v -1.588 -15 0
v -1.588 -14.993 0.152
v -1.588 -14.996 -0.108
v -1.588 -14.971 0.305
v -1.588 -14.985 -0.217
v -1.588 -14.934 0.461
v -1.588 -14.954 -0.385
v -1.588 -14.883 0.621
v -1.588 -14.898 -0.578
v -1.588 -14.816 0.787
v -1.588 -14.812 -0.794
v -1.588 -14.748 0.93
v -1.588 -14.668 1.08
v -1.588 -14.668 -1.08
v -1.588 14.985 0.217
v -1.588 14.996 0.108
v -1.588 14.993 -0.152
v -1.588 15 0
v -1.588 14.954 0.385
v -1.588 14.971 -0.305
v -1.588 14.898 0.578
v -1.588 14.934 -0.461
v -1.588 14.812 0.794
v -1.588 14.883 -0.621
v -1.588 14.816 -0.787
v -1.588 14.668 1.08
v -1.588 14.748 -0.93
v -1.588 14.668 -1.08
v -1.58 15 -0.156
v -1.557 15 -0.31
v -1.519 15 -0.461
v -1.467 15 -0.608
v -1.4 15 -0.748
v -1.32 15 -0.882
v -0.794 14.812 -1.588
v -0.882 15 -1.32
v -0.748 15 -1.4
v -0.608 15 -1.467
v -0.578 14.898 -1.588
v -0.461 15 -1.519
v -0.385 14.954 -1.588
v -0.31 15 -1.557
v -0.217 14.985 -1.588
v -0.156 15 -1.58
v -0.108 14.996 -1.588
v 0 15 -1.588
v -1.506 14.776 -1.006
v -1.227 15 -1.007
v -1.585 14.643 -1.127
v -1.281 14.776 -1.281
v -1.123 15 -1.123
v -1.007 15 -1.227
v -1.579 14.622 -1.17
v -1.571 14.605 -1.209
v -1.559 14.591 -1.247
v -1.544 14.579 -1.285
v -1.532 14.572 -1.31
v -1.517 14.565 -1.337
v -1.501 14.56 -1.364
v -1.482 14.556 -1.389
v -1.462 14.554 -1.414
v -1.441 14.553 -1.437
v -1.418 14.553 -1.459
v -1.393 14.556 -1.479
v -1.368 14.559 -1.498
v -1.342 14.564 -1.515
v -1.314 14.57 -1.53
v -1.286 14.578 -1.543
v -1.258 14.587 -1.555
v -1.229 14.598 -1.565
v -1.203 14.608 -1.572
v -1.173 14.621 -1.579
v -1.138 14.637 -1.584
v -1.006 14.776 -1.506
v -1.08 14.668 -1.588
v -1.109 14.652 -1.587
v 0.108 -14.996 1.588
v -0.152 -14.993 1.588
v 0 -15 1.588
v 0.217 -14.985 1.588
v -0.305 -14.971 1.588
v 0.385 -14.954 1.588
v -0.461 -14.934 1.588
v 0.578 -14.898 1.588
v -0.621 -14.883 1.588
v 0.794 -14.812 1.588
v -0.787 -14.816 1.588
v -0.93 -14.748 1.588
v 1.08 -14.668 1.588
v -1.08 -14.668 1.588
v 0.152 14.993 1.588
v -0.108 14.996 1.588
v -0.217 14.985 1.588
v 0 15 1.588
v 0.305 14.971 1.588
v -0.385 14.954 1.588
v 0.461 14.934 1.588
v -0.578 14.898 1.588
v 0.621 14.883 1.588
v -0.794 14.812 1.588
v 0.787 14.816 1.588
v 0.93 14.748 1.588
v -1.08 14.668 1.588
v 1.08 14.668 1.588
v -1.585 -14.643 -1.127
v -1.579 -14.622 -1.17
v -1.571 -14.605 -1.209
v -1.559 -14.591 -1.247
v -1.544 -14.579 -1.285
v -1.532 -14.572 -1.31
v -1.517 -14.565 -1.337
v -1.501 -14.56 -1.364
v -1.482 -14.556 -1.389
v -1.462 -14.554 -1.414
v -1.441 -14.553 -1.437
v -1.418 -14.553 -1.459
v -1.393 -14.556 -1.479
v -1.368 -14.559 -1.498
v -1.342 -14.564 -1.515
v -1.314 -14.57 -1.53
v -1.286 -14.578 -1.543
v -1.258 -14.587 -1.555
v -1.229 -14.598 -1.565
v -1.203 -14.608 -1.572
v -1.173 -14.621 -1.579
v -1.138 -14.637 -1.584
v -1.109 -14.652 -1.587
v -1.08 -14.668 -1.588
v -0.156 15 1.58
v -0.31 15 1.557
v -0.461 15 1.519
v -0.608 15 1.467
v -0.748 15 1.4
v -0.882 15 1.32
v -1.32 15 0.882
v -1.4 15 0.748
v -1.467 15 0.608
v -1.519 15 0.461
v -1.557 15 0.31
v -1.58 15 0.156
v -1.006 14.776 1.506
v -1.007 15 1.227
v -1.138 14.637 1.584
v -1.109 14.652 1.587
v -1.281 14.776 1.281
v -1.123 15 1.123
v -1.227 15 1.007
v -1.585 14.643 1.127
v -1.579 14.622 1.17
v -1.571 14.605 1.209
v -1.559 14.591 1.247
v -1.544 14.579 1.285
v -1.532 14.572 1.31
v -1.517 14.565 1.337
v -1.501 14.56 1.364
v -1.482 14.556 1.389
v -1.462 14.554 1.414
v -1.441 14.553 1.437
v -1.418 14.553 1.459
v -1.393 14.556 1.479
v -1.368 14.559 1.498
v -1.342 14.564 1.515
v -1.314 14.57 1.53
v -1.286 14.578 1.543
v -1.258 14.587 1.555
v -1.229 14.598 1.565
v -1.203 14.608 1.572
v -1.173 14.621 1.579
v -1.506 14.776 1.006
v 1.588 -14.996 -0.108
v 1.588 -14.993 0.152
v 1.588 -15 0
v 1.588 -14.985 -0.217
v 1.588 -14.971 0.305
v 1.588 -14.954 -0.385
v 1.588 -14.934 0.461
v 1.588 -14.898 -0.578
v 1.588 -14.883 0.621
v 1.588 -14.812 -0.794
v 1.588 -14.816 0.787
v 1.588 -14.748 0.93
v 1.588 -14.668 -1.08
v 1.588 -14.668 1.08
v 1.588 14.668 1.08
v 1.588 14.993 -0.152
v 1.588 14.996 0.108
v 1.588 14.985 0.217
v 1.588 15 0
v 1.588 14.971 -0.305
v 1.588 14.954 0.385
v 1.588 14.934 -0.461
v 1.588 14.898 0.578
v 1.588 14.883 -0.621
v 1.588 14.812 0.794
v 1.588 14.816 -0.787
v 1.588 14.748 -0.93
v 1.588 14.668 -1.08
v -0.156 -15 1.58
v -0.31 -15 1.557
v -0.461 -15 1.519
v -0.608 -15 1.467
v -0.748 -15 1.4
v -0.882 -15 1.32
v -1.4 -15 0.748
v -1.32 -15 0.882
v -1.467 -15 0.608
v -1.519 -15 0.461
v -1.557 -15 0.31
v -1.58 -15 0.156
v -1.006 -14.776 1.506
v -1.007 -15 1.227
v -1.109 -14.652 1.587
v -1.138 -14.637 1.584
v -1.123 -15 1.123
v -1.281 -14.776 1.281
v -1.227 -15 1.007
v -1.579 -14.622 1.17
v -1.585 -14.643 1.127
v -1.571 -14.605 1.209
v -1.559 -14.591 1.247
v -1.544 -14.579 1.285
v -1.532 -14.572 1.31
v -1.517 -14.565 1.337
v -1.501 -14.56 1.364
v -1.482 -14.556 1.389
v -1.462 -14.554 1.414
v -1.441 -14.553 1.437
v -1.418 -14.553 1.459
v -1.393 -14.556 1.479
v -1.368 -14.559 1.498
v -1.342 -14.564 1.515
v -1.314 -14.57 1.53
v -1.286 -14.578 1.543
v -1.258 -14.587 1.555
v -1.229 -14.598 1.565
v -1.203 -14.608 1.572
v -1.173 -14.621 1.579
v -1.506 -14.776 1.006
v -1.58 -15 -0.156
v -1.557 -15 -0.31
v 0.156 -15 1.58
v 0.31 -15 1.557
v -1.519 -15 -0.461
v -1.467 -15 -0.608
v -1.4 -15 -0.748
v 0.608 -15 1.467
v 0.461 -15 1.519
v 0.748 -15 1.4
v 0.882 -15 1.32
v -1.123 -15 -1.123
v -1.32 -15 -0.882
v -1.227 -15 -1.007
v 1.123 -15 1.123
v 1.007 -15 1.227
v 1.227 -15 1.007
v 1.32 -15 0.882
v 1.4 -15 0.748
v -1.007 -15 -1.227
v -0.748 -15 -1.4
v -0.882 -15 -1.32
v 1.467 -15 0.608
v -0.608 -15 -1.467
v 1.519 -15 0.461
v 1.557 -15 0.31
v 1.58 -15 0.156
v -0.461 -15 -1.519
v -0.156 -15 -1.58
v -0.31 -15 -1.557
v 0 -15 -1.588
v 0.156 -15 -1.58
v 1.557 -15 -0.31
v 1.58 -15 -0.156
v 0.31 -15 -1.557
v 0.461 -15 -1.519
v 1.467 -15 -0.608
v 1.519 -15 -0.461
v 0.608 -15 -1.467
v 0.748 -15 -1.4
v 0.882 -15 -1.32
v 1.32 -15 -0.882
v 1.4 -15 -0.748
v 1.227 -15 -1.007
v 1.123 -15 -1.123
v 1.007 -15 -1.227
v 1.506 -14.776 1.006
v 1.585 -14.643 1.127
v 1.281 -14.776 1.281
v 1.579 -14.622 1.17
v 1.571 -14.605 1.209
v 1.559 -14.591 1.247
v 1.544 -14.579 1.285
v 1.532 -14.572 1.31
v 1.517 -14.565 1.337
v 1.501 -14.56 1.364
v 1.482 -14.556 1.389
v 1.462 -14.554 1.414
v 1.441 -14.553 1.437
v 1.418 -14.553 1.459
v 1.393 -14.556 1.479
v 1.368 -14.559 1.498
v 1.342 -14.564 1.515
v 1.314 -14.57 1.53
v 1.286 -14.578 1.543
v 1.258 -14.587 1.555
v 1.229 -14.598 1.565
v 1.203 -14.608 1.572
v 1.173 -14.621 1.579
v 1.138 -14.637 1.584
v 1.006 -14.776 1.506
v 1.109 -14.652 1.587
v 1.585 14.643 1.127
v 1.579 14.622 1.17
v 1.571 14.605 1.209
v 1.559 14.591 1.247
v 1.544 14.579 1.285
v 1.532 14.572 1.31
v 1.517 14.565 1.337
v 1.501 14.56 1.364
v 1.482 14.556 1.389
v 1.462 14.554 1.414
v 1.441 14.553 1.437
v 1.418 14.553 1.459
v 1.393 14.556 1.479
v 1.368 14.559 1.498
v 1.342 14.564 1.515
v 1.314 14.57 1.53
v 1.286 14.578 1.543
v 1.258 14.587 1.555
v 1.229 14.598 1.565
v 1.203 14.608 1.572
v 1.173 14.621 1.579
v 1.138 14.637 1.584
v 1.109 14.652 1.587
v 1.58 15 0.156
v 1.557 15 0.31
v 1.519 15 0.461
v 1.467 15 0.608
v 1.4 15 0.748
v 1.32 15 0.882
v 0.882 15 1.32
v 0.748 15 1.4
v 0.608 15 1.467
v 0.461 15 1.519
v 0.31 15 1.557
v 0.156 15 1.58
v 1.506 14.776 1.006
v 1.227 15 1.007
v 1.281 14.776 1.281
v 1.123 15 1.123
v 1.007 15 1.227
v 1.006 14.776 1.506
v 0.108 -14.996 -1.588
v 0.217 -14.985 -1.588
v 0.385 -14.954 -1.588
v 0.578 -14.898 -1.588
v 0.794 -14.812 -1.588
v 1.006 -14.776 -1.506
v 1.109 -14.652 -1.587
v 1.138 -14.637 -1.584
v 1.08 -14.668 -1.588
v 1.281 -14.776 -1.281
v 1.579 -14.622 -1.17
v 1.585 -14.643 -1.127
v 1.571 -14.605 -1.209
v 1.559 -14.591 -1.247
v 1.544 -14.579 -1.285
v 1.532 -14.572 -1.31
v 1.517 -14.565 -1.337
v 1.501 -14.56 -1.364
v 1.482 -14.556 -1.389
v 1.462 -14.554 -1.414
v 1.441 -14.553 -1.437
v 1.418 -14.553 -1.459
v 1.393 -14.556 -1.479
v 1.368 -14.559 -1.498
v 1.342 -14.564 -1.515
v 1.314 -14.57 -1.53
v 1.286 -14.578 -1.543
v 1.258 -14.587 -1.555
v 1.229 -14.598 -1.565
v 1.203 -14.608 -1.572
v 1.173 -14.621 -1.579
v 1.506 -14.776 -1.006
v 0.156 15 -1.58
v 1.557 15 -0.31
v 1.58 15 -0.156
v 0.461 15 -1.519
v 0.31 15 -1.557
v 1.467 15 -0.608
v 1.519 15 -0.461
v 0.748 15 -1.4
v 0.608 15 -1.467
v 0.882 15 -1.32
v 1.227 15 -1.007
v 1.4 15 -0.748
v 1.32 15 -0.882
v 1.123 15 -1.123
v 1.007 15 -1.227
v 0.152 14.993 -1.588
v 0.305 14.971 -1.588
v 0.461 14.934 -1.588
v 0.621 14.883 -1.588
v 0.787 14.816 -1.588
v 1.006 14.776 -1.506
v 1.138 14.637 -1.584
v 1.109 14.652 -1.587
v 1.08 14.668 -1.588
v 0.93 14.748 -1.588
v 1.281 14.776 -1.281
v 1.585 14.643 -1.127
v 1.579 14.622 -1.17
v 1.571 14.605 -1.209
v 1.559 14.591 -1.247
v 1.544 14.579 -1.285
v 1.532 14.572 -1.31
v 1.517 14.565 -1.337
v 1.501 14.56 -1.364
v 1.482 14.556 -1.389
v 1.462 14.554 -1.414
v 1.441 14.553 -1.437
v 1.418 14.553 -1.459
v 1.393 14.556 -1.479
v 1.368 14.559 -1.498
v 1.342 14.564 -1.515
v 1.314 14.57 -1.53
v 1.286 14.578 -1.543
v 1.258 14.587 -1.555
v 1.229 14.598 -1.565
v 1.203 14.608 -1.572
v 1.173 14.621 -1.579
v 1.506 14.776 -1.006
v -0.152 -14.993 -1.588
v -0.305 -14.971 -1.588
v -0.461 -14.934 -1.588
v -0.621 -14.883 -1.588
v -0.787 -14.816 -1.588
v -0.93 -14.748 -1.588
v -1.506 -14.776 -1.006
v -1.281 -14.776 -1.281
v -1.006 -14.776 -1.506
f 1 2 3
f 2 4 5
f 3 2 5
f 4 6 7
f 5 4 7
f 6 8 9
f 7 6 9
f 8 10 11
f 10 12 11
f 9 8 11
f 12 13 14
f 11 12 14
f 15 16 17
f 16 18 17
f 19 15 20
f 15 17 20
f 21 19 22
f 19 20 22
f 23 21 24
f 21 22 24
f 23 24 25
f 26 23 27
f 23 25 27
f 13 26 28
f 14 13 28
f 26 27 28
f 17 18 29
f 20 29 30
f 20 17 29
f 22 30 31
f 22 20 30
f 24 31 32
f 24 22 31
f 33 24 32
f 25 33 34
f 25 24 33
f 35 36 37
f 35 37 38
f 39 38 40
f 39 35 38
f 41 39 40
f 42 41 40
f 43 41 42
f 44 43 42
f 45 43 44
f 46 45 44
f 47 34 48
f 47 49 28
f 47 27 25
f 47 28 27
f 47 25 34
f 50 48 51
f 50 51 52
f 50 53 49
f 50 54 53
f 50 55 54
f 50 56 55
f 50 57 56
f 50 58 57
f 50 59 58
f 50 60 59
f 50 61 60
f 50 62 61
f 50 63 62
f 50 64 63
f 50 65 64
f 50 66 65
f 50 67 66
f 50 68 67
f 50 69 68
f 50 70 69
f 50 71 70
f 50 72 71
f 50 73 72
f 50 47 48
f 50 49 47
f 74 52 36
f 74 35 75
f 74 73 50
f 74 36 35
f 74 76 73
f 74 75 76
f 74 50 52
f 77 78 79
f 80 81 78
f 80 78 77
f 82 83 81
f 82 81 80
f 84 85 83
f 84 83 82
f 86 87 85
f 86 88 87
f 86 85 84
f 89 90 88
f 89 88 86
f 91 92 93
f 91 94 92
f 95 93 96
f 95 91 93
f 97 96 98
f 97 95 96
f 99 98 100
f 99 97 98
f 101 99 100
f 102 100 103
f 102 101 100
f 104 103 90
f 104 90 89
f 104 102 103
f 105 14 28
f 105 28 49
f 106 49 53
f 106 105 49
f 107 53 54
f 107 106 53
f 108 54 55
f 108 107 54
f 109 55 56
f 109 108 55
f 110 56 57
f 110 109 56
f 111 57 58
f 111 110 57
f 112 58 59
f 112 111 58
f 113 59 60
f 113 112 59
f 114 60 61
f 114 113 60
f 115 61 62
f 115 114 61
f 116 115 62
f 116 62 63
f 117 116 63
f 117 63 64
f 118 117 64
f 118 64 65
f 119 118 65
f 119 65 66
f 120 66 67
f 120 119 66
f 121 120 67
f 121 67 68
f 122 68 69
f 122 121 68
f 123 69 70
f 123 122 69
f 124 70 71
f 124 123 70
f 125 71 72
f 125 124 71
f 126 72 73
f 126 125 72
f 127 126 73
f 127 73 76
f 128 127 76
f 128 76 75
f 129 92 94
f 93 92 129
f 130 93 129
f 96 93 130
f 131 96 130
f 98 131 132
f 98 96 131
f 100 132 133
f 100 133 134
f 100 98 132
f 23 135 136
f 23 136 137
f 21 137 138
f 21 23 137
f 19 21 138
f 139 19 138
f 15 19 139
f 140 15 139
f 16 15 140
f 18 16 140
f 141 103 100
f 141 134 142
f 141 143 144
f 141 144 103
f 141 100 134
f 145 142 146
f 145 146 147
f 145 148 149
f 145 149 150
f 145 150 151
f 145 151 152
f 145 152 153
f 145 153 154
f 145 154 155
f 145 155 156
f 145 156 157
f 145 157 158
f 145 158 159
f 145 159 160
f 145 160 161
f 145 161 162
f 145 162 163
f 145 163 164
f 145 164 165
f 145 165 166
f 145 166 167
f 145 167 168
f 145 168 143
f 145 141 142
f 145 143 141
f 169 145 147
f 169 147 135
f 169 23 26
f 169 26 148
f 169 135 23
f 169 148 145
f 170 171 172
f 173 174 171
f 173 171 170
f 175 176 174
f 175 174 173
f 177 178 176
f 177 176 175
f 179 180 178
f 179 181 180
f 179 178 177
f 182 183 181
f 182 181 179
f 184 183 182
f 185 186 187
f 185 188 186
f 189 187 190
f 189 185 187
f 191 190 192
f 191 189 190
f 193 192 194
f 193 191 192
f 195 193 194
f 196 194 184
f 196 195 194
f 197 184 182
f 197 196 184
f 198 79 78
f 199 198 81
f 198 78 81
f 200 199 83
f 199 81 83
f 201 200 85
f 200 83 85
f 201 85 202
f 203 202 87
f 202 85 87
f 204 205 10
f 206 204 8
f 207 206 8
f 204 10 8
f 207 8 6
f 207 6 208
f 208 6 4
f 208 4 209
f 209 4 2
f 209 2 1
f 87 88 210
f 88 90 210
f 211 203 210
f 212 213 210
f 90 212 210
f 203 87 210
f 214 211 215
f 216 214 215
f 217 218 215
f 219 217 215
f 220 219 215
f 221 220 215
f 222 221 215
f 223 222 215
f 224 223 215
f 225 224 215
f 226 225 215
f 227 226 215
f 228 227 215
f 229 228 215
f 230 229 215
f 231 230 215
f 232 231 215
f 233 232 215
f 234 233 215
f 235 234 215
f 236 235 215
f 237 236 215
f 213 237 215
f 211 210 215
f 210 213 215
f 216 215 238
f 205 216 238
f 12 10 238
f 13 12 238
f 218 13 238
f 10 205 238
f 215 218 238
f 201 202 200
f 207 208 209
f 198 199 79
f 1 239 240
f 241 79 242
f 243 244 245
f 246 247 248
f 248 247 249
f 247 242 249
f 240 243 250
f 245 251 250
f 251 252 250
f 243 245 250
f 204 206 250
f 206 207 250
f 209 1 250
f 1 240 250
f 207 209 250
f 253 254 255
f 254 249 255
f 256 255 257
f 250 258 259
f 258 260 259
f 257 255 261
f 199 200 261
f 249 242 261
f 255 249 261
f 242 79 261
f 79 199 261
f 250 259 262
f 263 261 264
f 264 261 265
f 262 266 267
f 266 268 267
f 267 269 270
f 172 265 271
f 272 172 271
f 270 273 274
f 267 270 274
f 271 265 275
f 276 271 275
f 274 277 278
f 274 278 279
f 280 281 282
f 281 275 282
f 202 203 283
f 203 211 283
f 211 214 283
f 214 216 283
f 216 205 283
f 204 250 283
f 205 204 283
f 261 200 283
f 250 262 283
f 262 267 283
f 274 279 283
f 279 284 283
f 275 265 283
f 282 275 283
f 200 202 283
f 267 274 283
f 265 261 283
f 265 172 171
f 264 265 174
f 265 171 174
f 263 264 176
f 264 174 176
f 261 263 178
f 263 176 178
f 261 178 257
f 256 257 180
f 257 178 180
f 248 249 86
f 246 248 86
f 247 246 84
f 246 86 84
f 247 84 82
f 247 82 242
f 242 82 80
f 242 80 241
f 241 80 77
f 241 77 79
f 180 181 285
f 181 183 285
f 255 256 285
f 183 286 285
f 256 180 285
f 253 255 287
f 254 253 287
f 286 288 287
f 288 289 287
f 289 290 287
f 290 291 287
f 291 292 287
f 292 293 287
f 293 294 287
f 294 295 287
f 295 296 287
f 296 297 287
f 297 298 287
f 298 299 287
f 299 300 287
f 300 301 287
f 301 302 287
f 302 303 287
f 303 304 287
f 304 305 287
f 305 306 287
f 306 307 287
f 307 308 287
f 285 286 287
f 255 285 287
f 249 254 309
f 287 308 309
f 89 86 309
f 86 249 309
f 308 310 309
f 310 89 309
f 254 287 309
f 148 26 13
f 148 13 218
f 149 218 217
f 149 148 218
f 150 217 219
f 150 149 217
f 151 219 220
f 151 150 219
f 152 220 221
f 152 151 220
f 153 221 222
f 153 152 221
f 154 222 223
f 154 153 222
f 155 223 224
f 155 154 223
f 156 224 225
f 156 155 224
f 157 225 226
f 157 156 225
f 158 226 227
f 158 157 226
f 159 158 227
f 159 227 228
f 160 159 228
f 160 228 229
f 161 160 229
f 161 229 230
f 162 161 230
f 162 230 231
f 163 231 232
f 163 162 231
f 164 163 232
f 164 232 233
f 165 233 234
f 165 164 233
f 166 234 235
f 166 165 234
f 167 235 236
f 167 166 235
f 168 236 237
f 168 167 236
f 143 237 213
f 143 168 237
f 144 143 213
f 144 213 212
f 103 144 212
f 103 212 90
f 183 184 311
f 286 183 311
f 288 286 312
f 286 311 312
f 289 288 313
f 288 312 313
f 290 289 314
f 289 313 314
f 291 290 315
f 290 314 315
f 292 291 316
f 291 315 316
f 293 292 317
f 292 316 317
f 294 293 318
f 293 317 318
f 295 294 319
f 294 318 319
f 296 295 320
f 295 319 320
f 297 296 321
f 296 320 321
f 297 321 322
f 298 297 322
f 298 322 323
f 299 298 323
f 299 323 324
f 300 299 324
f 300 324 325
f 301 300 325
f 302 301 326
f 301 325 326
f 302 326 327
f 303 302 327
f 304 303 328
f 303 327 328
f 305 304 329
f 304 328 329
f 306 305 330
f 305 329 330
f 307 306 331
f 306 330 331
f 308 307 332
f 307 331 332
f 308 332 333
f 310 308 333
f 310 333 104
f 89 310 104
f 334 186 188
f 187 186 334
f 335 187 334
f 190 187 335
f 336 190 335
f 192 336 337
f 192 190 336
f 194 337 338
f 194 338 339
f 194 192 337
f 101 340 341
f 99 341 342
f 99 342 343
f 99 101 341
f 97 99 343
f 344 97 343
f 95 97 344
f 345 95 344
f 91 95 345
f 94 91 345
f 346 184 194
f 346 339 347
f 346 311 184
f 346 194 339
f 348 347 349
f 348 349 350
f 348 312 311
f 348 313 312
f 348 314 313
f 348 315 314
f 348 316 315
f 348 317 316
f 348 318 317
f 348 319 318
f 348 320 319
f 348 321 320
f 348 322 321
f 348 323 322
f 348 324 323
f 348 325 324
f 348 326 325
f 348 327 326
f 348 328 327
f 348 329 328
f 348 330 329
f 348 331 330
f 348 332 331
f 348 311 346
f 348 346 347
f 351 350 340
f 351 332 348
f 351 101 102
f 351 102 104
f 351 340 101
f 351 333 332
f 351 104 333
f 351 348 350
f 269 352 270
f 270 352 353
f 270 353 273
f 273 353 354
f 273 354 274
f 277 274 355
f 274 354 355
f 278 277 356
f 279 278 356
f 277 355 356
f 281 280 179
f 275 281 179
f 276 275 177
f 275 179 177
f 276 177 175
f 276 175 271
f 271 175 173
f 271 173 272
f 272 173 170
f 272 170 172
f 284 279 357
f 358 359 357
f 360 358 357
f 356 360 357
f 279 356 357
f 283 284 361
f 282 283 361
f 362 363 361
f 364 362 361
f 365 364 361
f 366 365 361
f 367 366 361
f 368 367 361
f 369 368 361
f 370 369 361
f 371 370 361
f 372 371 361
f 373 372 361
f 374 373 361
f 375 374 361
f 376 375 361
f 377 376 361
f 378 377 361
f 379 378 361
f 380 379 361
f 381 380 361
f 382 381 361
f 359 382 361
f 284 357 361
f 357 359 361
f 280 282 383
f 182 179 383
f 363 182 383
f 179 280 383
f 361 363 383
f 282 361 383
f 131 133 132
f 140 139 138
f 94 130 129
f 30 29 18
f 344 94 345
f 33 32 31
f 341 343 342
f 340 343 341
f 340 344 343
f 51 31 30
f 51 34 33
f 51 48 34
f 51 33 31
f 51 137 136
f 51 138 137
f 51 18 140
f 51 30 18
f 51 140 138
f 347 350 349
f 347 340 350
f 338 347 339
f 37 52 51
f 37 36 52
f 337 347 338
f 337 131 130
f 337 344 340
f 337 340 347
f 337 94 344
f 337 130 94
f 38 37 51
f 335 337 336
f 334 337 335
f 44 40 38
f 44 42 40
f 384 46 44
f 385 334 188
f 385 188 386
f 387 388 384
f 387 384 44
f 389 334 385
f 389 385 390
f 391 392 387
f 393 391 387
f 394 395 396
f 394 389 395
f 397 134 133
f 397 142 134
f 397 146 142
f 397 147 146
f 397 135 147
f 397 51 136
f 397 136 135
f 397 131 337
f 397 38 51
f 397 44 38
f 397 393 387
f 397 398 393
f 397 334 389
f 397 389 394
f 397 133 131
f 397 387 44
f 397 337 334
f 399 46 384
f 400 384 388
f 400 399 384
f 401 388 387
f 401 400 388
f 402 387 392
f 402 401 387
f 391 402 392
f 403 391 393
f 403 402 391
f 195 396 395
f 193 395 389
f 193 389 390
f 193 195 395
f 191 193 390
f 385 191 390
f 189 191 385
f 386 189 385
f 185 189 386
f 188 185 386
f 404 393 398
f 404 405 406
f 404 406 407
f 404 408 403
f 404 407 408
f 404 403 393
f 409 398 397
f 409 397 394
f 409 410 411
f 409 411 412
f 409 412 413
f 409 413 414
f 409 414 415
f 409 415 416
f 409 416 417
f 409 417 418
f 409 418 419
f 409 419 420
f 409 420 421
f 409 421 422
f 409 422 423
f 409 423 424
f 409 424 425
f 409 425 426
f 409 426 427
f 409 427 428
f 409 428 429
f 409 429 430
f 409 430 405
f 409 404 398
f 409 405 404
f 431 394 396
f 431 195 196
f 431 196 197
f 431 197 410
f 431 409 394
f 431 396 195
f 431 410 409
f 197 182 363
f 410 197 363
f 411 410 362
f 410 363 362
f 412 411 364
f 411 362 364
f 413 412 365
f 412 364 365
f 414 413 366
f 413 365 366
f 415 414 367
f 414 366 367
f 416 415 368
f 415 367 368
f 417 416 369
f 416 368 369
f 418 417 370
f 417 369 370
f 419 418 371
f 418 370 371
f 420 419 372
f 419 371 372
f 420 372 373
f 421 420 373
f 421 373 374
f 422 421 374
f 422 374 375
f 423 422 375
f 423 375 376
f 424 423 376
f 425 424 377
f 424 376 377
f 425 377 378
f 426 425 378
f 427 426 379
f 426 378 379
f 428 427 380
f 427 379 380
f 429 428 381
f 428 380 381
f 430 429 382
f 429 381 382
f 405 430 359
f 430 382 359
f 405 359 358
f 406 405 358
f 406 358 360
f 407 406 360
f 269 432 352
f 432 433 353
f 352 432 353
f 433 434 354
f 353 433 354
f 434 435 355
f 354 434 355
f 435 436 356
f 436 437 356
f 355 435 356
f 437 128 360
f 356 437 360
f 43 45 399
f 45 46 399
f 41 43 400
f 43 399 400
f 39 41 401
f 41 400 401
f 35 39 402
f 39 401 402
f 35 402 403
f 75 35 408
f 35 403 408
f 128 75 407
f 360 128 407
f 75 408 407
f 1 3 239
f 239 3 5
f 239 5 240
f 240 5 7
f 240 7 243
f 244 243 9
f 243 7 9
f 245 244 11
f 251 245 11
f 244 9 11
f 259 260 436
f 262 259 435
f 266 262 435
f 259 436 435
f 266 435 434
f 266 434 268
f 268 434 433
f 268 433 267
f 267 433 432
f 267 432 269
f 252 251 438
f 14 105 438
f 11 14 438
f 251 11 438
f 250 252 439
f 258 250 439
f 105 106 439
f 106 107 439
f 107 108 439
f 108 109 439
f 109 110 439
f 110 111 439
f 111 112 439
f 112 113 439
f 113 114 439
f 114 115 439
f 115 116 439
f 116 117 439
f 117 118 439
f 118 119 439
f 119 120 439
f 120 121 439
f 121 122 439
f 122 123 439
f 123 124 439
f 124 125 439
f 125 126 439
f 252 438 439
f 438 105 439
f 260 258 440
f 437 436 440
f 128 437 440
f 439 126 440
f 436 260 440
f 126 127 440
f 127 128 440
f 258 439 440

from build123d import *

# Parameters (mm, degrees)
SKETCH1_W           = 3.175
SKETCH1_H           = 3.175
BOSS_EXTRUDE1_DEPTH = 15
FILLET1_R           = 0.508


with BuildPart() as part:
    # Sketch1 → Boss-Extrude1 (new, symmetric)
    with BuildSketch(Plane(origin=(0, 0, 0), x_dir=(1, 0, 0), z_dir=(0, 1, 0))):
        Rectangle(SKETCH1_W, SKETCH1_H)
    extrude(amount=BOSS_EXTRUDE1_DEPTH, both=True)

    # Fillet1
    fillet1_edges = [part.edges().sort_by_distance(p)[0] for p in [
        (1.5875, 0, 1.5875),
        (-1.5875, 0, 1.5875),
        (-1.5875, 0, -1.5875),
        (1.5875, 0, -1.5875),
    ]]
    fillet(fillet1_edges, radius=FILLET1_R)

    # Sketch3 → Cut-Revolve3 (revolve, cut)
    with BuildSketch(Plane.XY):
        Polygon((1.5875, -15), (2.294606781, -14.292893219), (2.294606781, -16), (1.5875, -16), align=None)
    cut_revolve3 = revolve(axis=Axis((0, 0, 0), (0, -1, 0)), mode=Mode.SUBTRACT)

    # Mirror1: Cut-Revolve3 across plane
    add(cut_revolve3.mirror(Plane.ZX), mode=Mode.SUBTRACT)


solid = part.part
